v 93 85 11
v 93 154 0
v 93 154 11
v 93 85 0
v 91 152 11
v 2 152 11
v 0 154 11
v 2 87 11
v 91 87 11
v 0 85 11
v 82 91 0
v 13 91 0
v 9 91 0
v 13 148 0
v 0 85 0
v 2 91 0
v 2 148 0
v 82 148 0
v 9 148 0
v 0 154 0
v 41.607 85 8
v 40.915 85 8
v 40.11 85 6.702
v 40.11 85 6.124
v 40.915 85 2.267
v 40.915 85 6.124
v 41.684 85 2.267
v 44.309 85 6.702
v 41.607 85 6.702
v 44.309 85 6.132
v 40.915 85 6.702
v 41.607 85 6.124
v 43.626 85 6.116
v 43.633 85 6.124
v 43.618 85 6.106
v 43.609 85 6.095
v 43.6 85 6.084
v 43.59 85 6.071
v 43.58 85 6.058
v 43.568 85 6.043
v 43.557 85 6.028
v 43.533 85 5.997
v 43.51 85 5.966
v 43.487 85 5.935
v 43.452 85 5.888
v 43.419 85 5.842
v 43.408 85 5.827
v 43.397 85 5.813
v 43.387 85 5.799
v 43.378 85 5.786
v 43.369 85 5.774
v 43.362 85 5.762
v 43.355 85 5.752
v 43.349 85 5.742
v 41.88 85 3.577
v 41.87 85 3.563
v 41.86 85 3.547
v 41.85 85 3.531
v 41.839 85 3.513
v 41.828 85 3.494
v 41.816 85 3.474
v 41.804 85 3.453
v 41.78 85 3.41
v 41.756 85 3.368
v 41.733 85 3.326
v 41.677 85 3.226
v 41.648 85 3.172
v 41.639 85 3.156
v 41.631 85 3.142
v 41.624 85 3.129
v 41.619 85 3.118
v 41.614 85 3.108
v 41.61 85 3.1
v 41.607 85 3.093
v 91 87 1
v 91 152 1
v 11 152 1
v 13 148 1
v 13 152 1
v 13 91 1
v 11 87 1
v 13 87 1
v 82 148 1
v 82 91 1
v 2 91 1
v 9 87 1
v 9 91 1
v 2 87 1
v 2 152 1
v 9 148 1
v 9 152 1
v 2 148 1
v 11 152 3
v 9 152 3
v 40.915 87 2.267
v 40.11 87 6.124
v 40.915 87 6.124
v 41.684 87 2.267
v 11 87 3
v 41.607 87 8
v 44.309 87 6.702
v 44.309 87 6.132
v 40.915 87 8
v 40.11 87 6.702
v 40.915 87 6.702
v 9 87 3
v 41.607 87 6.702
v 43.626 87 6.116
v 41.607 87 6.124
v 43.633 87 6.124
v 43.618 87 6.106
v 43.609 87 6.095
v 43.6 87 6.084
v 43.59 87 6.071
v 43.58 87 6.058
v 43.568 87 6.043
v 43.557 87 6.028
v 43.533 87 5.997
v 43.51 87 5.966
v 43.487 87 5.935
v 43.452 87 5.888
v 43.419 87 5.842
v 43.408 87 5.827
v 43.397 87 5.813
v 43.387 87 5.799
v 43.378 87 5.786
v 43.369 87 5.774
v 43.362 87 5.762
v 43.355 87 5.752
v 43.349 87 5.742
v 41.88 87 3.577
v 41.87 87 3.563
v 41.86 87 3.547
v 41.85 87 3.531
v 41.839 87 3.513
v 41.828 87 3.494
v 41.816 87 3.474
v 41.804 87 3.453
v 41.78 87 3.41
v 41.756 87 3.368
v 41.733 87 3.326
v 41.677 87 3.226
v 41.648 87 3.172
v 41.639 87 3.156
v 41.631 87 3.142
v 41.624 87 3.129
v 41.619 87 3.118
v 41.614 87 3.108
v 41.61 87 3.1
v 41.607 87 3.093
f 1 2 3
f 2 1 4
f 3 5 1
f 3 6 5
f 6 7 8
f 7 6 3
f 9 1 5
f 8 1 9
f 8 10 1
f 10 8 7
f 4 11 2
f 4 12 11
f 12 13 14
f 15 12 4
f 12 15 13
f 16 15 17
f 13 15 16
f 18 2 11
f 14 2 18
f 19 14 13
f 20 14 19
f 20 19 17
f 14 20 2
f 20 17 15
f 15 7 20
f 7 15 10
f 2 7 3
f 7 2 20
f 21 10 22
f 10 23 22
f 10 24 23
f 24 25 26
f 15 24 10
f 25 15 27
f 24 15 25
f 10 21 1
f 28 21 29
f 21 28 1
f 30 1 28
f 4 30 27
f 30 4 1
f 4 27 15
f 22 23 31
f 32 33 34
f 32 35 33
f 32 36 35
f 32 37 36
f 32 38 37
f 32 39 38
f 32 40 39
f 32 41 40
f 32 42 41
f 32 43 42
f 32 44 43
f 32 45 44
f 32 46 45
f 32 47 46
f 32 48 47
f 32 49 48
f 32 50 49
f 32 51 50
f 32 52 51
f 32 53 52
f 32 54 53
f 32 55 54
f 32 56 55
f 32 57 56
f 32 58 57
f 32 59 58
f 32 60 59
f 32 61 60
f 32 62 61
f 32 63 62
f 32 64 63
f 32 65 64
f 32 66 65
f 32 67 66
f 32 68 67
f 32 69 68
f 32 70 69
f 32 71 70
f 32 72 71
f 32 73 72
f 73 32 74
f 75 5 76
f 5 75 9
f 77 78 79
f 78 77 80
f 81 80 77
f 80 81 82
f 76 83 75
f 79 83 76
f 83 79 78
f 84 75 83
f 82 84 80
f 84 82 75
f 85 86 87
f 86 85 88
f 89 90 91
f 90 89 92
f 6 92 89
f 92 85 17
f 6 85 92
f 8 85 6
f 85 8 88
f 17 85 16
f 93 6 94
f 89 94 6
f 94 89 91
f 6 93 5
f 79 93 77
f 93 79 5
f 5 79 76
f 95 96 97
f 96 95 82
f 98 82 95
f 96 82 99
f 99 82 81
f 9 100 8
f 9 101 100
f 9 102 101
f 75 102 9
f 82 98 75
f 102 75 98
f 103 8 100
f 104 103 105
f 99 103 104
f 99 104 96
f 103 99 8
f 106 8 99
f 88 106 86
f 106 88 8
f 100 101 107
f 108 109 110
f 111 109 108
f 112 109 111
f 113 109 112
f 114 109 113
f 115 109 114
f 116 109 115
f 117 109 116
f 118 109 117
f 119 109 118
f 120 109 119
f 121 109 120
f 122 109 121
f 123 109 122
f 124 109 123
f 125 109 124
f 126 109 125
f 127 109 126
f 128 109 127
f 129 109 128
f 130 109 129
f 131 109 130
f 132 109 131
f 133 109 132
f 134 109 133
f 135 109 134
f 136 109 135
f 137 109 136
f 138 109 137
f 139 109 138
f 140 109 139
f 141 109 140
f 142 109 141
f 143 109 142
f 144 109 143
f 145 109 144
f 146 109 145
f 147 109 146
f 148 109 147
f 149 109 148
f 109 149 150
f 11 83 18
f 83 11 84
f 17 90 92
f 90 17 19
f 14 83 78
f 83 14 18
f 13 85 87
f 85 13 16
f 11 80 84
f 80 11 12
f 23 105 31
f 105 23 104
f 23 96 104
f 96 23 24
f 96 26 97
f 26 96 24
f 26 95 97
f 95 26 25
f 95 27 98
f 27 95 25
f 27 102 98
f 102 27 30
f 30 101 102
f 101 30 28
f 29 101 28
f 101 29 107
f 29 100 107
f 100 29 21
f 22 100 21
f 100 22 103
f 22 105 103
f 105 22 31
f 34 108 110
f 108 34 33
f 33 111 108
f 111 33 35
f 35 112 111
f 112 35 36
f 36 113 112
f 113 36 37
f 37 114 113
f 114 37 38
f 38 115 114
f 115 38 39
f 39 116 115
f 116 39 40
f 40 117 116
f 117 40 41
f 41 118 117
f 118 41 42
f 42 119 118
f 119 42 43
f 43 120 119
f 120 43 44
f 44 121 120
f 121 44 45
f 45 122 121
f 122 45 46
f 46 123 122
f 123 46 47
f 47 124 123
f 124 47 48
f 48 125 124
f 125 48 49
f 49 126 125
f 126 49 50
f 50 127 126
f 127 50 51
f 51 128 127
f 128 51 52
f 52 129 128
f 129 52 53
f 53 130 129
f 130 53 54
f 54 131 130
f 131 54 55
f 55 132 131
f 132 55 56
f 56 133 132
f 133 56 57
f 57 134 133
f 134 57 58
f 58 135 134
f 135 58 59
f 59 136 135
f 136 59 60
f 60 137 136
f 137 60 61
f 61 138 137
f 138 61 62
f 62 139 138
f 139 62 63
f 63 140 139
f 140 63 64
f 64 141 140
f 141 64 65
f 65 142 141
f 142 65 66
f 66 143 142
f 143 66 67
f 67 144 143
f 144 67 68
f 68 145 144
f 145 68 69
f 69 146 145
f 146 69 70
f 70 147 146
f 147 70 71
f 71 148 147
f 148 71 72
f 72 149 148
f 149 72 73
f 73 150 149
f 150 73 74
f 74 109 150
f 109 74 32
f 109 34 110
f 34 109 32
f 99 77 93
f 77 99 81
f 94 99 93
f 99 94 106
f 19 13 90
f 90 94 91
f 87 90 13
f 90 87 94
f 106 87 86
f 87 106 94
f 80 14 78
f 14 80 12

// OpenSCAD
$fn=50;
box_height = 8;
box_length = 89;
box_width = 65;
top_height = 11;
wall_ext_thickness = 2;
model_version = "4";

module base() {
  difference() {
    cube([box_length+wall_ext_thickness*2, 
      box_width+wall_ext_thickness*2,box_height]);
    translate([wall_ext_thickness,wall_ext_thickness,2])
      cube([box_length, box_width, box_height]);
  }
}

module base_top() {
  difference() {
    cube([box_length+wall_ext_thickness*2, 
      box_width+wall_ext_thickness*2,top_height]);
    translate([wall_ext_thickness,wall_ext_thickness,1])
      cube([box_length, box_width, top_height]);
  }
}

module holes_spacers() {
  radius = 2;
  
  // hole bottom left
  translate([wall_ext_thickness+3, 
    wall_ext_thickness+3, 
    -1])
    cylinder(box_height, 2,2);

  // hole top left
  translate([wall_ext_thickness+3, 
    box_width-1, 
    -1])
    cylinder(box_height, 2,2);

  // hole bottom right
  translate([box_length-wall_ext_thickness+1, 
    wall_ext_thickness+3, 
    -1])
    cylinder(box_height, 2,2);

  // hole top right
  translate([box_length-wall_ext_thickness+1, 
    box_width-1, 
    -1])
    cylinder(box_height, 2,2);
}

module holes_ports() {
  // sdcard 
  translate([box_length+wall_ext_thickness-3,20, -1])
    color("#ff0000")
    cube([wall_ext_thickness+5,20,box_height+5]);

    // microusb
//  translate([box_length+wall_ext_thickness-1,5, 2+3])
//    color("#ff0000")
//    cube([wall_ext_thickness+2,35,box_height]);
}

module VersionNum() {
  translate([box_length/2,box_width/2,3])
    rotate([0,180,0])
    linear_extrude(4)
    text(model_version, size=10);
}

module VersionNumTop() {
  translate([box_length/2,3,8])
    rotate([90,180,0])
    linear_extrude(4)
    text(model_version, size=6);
}

module box_top() {
  difference() {
    base_top();
    translate([2,6,-1])
      cube([box_length-9, box_width-8, top_height+2]);
    VersionNumTop();
  }
  translate([9,2,0])
    cube([2, box_width, 3]);
  translate([9,2,0])
    cube([4, box_width, 1]);


}

//difference() {
//  base();
//  holes_spacers();
//  holes_ports();
//  VersionNum();
//}

translate([0,box_width + 20,0])
  box_top();
